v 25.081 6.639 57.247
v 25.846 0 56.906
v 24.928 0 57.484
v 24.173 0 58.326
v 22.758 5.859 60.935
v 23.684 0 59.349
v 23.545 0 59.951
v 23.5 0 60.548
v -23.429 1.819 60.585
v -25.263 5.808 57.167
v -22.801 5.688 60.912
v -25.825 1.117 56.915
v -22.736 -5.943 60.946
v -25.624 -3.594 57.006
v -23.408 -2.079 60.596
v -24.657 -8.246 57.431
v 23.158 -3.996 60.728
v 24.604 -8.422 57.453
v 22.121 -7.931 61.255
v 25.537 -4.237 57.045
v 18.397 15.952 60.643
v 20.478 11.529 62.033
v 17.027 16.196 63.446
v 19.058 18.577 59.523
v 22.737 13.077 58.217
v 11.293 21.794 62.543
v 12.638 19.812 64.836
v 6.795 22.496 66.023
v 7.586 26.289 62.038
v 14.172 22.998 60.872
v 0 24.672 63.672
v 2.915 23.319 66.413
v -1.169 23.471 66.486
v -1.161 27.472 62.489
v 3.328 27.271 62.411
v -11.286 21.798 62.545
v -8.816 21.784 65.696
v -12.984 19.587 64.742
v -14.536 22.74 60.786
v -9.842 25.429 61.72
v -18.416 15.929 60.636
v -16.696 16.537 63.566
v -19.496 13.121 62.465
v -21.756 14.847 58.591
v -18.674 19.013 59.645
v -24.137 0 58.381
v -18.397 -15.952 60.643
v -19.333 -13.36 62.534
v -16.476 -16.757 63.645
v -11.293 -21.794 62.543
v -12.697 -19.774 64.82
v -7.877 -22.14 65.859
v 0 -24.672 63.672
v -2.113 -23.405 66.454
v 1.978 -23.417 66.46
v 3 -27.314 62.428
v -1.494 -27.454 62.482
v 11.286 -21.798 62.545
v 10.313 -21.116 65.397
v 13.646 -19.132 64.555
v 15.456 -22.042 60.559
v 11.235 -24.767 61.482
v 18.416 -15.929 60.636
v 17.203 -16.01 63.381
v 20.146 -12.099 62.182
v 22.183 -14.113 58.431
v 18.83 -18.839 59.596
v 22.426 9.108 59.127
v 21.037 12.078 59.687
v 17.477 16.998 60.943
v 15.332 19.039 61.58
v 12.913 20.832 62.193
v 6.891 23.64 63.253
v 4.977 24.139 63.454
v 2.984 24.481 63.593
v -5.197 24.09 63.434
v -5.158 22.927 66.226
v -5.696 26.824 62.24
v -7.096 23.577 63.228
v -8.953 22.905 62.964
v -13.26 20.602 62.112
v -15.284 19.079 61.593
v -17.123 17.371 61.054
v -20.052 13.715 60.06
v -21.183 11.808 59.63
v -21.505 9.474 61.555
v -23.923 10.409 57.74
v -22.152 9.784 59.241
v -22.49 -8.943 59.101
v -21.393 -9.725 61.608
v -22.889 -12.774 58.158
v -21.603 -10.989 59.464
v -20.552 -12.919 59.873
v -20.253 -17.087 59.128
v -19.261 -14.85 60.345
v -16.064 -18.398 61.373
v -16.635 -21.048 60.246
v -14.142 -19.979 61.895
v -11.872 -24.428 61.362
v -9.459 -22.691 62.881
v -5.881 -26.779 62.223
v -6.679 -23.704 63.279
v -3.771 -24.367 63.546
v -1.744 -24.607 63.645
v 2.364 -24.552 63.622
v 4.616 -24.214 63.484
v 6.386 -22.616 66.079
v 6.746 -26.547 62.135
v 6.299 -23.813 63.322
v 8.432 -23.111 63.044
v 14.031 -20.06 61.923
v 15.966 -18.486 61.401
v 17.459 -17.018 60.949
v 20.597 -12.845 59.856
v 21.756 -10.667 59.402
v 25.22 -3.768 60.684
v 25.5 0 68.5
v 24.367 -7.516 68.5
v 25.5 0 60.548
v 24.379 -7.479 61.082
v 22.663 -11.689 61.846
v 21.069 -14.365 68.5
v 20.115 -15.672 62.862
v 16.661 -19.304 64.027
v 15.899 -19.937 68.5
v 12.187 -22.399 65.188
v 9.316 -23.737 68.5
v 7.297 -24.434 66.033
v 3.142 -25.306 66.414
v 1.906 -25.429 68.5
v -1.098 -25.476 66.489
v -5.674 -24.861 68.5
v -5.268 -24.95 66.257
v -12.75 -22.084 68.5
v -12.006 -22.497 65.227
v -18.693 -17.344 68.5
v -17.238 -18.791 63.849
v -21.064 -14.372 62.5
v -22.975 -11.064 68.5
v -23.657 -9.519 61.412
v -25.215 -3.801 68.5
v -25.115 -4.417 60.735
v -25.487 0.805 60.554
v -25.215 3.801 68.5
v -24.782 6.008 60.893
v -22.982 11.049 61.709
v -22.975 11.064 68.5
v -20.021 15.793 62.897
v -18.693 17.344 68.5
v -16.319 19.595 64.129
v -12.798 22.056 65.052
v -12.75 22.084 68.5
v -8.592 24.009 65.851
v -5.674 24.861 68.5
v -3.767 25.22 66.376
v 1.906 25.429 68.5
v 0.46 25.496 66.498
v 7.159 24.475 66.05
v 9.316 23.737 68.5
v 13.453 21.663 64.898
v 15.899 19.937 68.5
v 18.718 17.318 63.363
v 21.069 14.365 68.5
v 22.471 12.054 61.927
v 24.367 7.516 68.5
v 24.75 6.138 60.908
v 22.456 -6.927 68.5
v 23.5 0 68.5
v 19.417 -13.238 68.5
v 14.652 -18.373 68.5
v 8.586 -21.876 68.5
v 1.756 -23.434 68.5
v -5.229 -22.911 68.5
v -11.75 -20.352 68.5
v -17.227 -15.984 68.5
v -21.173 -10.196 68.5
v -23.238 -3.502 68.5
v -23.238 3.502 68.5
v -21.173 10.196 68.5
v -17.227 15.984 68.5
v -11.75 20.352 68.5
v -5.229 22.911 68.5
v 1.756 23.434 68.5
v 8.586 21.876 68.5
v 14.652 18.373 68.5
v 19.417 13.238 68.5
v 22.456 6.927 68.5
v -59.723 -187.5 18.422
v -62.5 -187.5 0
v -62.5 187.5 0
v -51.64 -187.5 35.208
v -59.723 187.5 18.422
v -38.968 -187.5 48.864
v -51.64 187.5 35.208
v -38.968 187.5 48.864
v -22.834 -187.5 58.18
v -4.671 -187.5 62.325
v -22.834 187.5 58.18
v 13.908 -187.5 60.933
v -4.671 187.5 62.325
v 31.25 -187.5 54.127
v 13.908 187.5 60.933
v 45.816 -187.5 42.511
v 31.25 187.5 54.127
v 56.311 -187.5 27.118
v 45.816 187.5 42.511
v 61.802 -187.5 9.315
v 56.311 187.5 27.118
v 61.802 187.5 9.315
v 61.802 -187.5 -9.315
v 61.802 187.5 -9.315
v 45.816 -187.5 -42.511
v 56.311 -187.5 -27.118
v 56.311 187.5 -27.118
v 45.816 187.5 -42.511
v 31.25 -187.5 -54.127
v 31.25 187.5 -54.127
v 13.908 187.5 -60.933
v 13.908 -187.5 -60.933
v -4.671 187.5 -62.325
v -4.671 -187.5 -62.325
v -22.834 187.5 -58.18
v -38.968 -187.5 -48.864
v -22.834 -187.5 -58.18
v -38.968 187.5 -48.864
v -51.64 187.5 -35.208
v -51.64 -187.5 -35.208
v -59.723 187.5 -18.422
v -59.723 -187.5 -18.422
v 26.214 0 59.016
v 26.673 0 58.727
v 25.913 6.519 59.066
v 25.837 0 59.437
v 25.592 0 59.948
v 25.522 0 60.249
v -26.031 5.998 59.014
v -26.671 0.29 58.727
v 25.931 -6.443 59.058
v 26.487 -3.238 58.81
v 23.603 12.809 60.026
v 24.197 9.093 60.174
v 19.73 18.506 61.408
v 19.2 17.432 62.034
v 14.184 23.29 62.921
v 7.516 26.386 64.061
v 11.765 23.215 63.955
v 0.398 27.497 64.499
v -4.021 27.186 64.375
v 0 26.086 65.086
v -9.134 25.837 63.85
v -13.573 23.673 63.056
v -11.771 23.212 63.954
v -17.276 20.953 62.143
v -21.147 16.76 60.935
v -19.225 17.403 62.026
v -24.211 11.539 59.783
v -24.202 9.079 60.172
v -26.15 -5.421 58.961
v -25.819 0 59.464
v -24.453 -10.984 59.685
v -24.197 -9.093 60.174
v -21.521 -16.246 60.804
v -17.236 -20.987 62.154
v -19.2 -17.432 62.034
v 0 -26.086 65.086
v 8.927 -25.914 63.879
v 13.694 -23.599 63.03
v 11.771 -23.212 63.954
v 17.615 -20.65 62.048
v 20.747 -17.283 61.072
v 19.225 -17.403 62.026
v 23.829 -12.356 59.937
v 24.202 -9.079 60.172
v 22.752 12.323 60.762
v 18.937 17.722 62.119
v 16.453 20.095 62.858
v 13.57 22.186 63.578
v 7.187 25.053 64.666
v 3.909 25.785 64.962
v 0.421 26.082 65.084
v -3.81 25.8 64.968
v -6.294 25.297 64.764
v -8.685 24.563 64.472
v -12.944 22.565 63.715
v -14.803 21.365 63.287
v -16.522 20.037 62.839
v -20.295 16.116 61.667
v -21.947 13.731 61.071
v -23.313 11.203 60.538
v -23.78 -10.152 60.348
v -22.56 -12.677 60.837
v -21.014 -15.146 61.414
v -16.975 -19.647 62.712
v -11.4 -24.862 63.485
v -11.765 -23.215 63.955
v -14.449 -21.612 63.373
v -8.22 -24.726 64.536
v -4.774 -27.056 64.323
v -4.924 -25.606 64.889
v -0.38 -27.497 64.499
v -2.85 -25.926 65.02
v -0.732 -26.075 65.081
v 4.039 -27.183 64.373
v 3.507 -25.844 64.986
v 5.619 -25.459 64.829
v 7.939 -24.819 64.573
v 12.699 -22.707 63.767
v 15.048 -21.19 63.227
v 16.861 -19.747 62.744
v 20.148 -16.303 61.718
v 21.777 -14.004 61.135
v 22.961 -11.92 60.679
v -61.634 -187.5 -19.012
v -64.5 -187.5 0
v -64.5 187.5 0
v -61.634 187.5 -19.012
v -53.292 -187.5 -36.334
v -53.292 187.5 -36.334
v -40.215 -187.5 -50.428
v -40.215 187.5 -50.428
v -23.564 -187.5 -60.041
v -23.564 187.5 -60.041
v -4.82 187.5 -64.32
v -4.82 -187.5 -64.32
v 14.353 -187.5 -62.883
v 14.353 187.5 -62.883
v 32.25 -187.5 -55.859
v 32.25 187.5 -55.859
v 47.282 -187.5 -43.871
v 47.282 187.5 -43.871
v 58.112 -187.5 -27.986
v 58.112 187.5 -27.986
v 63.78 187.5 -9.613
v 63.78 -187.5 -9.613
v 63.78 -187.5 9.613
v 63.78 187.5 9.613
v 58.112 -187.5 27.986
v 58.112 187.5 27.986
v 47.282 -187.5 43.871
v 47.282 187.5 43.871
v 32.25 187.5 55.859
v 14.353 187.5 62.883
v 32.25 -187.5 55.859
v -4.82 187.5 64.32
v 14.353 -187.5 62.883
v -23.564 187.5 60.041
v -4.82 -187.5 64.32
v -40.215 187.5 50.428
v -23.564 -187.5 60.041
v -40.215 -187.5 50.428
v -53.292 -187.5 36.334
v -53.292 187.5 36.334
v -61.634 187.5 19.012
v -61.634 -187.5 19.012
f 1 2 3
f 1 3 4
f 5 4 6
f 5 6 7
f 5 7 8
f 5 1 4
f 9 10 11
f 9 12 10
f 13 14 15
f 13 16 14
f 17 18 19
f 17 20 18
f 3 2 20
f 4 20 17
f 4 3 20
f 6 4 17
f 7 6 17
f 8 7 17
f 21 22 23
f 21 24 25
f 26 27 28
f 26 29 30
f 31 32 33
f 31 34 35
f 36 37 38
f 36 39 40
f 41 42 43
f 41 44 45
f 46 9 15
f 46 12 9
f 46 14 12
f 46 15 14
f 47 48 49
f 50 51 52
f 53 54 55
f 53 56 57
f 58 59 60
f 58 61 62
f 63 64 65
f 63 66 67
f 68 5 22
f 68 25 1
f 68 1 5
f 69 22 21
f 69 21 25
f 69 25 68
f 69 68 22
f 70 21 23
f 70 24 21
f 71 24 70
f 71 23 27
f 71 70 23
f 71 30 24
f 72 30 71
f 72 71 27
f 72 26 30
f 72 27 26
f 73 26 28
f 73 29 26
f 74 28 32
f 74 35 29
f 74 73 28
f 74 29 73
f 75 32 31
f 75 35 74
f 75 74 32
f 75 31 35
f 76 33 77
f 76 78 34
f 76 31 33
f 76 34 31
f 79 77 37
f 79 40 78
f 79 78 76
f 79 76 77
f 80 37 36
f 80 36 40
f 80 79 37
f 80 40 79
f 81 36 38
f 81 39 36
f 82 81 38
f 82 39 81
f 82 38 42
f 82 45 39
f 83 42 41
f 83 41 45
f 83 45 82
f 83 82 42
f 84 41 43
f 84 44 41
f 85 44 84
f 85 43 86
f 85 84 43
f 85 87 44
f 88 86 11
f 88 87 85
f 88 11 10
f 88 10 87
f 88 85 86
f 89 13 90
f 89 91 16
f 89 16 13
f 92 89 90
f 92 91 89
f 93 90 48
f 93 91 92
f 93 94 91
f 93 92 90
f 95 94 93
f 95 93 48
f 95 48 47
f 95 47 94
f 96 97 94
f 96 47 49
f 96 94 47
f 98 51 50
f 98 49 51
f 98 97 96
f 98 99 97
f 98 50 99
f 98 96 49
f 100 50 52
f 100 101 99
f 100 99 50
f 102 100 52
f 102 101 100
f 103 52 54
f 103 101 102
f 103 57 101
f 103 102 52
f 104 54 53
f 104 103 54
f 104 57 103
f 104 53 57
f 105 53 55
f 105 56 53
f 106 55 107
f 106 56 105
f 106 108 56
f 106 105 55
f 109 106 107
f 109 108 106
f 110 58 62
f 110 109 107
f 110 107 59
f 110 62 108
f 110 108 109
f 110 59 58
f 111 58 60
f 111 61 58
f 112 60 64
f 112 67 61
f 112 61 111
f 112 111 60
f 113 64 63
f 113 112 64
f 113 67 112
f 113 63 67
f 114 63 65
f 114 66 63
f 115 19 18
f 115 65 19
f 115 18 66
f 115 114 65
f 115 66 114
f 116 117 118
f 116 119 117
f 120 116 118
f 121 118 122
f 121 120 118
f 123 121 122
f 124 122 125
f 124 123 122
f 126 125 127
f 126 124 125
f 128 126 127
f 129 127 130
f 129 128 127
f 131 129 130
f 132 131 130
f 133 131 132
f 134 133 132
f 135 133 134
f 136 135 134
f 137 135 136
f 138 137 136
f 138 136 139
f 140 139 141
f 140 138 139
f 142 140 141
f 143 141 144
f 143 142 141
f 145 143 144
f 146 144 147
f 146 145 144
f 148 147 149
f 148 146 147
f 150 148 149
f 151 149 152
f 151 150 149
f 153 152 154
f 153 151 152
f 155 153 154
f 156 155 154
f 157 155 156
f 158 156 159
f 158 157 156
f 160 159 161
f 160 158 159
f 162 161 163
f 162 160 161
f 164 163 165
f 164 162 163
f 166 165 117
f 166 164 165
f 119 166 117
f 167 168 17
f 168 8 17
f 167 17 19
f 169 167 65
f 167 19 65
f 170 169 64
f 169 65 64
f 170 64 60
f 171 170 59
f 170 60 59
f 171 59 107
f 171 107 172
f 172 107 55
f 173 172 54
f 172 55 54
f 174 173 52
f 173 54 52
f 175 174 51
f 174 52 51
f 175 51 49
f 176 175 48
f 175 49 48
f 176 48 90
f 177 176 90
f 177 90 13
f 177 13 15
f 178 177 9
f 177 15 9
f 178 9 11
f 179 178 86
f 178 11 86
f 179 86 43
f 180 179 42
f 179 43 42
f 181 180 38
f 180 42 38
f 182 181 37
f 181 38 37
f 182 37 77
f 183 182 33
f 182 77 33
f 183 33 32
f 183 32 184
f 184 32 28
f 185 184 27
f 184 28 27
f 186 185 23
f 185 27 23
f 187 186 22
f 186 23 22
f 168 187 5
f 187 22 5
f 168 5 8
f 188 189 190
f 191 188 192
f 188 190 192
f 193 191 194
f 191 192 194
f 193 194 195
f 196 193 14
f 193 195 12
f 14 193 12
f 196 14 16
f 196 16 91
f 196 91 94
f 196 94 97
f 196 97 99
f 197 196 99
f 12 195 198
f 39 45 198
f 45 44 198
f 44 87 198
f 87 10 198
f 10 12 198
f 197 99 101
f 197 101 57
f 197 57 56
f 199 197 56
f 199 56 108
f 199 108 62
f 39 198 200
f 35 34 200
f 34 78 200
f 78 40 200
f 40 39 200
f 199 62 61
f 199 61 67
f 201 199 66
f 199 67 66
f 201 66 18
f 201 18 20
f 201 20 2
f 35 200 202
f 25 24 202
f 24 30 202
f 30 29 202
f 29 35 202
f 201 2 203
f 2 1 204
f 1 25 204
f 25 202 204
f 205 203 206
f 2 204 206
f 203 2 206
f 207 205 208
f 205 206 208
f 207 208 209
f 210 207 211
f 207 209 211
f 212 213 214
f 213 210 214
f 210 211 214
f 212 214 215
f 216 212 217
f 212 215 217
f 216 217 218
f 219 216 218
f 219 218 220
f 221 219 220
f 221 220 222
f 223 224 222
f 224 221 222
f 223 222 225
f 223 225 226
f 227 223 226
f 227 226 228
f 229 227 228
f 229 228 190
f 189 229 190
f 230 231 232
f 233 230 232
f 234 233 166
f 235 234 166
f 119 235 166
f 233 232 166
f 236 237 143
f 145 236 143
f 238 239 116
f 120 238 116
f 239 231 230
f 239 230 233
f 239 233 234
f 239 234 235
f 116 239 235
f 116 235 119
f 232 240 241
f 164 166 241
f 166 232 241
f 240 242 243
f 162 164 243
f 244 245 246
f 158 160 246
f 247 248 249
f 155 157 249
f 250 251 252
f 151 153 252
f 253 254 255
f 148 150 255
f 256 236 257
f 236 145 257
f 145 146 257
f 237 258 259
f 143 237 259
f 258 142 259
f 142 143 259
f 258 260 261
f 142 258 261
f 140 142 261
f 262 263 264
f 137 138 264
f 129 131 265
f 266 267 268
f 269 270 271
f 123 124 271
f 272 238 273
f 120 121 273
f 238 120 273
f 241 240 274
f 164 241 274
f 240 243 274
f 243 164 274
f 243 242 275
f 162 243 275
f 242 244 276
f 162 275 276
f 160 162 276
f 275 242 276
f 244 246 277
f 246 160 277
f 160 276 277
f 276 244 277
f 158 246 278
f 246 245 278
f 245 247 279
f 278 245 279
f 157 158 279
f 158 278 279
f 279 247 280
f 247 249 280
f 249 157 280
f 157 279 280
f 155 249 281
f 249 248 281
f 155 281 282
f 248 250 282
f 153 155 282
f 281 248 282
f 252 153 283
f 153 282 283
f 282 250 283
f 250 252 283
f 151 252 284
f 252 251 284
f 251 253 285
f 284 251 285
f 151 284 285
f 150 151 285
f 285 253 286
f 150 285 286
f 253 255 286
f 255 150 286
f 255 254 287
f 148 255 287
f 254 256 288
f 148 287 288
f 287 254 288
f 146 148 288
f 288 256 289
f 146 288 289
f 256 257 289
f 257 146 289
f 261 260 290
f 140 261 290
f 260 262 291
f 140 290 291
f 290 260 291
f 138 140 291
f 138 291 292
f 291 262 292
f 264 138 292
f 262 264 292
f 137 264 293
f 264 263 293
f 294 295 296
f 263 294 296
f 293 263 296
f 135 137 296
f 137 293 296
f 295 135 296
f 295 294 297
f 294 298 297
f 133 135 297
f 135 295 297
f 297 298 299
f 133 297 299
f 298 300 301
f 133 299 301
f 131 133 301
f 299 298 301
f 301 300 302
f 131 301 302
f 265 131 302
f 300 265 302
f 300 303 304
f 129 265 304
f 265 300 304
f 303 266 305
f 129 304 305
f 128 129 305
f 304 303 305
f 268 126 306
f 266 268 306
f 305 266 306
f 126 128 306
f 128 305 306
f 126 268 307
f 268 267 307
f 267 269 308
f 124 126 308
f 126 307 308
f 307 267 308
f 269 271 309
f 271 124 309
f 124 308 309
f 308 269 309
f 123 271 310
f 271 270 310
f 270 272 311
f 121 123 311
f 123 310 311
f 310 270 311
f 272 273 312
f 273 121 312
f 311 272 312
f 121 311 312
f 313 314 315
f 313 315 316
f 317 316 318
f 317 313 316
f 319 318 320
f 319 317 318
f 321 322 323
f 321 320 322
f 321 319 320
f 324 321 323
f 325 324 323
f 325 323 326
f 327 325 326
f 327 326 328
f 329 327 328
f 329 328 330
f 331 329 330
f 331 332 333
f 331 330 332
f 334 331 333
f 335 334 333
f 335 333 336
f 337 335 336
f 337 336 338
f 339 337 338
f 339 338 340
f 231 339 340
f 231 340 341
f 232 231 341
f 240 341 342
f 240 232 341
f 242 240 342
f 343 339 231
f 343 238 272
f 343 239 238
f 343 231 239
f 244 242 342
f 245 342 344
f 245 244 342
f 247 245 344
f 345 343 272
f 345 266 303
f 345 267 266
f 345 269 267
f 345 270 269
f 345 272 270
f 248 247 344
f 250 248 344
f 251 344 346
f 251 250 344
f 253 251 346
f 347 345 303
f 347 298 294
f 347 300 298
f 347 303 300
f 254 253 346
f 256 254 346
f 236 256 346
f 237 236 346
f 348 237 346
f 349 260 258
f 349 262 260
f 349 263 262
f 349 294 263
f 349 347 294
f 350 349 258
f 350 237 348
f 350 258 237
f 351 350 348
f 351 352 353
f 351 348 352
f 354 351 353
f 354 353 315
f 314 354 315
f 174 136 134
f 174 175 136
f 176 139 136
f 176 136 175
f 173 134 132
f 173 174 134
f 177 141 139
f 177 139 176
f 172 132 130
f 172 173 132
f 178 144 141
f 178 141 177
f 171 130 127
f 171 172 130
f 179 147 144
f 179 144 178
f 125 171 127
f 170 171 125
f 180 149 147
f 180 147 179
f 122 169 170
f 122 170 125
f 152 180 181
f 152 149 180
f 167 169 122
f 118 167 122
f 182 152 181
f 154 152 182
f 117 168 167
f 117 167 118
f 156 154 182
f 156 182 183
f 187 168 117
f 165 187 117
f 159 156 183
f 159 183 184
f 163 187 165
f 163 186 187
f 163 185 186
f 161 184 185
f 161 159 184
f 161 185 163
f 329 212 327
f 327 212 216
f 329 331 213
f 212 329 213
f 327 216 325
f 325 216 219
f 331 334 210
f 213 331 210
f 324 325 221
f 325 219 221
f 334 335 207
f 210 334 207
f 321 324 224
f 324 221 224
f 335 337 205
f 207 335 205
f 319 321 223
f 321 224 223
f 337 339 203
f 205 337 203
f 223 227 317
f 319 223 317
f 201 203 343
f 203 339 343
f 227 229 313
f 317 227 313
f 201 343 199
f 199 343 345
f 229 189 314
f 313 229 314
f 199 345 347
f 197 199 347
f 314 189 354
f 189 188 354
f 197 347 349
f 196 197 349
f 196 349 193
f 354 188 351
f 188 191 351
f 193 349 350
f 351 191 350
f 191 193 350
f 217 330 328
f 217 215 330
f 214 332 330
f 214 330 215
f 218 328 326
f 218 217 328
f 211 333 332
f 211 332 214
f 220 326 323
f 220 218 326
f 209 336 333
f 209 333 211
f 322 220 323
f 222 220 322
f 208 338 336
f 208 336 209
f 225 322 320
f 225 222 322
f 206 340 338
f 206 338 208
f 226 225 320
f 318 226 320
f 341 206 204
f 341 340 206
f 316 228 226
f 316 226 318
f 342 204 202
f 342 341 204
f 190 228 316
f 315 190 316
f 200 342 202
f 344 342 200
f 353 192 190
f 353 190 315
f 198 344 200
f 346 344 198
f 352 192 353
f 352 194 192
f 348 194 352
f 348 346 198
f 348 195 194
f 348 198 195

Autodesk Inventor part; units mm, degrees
ref_plane "YZ Plane" through (0, 0, 0) normal (1, 0, 0) x (0, 1, 0)
ref_plane "XZ Plane" through (0, 0, 0) normal (0, 1, 0) x (-1, 0, 0)
ref_plane "XY Plane" through (0, 0, 0) normal (0, 0, 1) x (1, 0, 0)
sketch "Szkic8" plane through (0, 0, 0) normal (0, 1, 0) x (-1, 0, 0)
  circle A0 centre (0, 0) radius 64.5
  circle A1 centre (0, 0) radius 62.5
  dimension "d53" = 129
  dimension "d54" = 2
extrude "Wyciągnięcie proste2" add sketch "Szkic8" along normal mid plane 375
sketch "Szkic13" plane through (0, 0, 0) normal (0, 0, 1) x (1, 0, 0)
  circle A0 centre (0, 0) radius 25.5
  circle A1 centre (0, 0) radius 23.5
  dimension "d67" = 51
  dimension "d68" = 2
extrude "Wyciągnięcie proste6" add sketch "Szkic13" along normal blind 68.5
sketch "Szkic14" plane through (0, 0, 68.5) normal (0, 0, 1) x (1, 0, 0)
  circle A0 centre (0, 0) radius 23.5 projected
extrude "Wyciągnięcie proste7" cut sketch "Szkic14" against normal blind 68.5
sketch "Szkic15" plane through (0, -187.5, 0) normal (0, -1, 0) x (1, 0, 0)
  circle A0 centre (0, 0) radius 62.5 projected
extrude "Wyciągnięcie proste8" cut sketch "Szkic15" against normal blind 375
fillet "Zaokrąglenie3" radius 2 2 edges at (-0.0041, 25.5, 64.5) (0.0041, -25.5, 64.5)
fillet "Zaokrąglenie4" radius 4 2 edges at (-0.0002, -23.5, 62.5) (-0.0017, 23.5, 62.5)
equation "\"d53\" = OD"
equation "\"d54\" = THK"
equation "\"d55\" = L1"
equation "\"d67\" = OD2"
equation "\"d68\" = THK"
equation "\"d69\" = L2"
equation "\"d71\" = L2"
equation "\"d73\" = L1"
equation "\"d75\" = THK"
equation "\"d76\" = 2 * THK"
equation "\"SzerokośćGięciaPodcięcia\" = Grubość"
equation "\"RozmiarPodcięciaNarożnika\" = 4 * Grubość"
equation "\"PromieńPrzejścia\" = PromieńGięcia"
equation "\"Rozmiar_promienia_Jacobiego\" = PromieńGięcia"
equation "\"Wielk_odstępu\" = Grubość"
equation "\"d2\" = PromieńGięcia"
equation "\"d23\" = PromieńGięcia"
equation "\"OD\" = 129"
equation "\"THK\" = 2"
equation "\"L1\" = 375"
equation "\"L2\" = 68.5"
equation "\"OD2\" = 51"
equation "\"Grubość\" = 1.5"
equation "\"PromieńGięcia\" = 3"
properties part number "Trójnik red. krótki  Ø129 51 129 s=2 L=375" material "304"
